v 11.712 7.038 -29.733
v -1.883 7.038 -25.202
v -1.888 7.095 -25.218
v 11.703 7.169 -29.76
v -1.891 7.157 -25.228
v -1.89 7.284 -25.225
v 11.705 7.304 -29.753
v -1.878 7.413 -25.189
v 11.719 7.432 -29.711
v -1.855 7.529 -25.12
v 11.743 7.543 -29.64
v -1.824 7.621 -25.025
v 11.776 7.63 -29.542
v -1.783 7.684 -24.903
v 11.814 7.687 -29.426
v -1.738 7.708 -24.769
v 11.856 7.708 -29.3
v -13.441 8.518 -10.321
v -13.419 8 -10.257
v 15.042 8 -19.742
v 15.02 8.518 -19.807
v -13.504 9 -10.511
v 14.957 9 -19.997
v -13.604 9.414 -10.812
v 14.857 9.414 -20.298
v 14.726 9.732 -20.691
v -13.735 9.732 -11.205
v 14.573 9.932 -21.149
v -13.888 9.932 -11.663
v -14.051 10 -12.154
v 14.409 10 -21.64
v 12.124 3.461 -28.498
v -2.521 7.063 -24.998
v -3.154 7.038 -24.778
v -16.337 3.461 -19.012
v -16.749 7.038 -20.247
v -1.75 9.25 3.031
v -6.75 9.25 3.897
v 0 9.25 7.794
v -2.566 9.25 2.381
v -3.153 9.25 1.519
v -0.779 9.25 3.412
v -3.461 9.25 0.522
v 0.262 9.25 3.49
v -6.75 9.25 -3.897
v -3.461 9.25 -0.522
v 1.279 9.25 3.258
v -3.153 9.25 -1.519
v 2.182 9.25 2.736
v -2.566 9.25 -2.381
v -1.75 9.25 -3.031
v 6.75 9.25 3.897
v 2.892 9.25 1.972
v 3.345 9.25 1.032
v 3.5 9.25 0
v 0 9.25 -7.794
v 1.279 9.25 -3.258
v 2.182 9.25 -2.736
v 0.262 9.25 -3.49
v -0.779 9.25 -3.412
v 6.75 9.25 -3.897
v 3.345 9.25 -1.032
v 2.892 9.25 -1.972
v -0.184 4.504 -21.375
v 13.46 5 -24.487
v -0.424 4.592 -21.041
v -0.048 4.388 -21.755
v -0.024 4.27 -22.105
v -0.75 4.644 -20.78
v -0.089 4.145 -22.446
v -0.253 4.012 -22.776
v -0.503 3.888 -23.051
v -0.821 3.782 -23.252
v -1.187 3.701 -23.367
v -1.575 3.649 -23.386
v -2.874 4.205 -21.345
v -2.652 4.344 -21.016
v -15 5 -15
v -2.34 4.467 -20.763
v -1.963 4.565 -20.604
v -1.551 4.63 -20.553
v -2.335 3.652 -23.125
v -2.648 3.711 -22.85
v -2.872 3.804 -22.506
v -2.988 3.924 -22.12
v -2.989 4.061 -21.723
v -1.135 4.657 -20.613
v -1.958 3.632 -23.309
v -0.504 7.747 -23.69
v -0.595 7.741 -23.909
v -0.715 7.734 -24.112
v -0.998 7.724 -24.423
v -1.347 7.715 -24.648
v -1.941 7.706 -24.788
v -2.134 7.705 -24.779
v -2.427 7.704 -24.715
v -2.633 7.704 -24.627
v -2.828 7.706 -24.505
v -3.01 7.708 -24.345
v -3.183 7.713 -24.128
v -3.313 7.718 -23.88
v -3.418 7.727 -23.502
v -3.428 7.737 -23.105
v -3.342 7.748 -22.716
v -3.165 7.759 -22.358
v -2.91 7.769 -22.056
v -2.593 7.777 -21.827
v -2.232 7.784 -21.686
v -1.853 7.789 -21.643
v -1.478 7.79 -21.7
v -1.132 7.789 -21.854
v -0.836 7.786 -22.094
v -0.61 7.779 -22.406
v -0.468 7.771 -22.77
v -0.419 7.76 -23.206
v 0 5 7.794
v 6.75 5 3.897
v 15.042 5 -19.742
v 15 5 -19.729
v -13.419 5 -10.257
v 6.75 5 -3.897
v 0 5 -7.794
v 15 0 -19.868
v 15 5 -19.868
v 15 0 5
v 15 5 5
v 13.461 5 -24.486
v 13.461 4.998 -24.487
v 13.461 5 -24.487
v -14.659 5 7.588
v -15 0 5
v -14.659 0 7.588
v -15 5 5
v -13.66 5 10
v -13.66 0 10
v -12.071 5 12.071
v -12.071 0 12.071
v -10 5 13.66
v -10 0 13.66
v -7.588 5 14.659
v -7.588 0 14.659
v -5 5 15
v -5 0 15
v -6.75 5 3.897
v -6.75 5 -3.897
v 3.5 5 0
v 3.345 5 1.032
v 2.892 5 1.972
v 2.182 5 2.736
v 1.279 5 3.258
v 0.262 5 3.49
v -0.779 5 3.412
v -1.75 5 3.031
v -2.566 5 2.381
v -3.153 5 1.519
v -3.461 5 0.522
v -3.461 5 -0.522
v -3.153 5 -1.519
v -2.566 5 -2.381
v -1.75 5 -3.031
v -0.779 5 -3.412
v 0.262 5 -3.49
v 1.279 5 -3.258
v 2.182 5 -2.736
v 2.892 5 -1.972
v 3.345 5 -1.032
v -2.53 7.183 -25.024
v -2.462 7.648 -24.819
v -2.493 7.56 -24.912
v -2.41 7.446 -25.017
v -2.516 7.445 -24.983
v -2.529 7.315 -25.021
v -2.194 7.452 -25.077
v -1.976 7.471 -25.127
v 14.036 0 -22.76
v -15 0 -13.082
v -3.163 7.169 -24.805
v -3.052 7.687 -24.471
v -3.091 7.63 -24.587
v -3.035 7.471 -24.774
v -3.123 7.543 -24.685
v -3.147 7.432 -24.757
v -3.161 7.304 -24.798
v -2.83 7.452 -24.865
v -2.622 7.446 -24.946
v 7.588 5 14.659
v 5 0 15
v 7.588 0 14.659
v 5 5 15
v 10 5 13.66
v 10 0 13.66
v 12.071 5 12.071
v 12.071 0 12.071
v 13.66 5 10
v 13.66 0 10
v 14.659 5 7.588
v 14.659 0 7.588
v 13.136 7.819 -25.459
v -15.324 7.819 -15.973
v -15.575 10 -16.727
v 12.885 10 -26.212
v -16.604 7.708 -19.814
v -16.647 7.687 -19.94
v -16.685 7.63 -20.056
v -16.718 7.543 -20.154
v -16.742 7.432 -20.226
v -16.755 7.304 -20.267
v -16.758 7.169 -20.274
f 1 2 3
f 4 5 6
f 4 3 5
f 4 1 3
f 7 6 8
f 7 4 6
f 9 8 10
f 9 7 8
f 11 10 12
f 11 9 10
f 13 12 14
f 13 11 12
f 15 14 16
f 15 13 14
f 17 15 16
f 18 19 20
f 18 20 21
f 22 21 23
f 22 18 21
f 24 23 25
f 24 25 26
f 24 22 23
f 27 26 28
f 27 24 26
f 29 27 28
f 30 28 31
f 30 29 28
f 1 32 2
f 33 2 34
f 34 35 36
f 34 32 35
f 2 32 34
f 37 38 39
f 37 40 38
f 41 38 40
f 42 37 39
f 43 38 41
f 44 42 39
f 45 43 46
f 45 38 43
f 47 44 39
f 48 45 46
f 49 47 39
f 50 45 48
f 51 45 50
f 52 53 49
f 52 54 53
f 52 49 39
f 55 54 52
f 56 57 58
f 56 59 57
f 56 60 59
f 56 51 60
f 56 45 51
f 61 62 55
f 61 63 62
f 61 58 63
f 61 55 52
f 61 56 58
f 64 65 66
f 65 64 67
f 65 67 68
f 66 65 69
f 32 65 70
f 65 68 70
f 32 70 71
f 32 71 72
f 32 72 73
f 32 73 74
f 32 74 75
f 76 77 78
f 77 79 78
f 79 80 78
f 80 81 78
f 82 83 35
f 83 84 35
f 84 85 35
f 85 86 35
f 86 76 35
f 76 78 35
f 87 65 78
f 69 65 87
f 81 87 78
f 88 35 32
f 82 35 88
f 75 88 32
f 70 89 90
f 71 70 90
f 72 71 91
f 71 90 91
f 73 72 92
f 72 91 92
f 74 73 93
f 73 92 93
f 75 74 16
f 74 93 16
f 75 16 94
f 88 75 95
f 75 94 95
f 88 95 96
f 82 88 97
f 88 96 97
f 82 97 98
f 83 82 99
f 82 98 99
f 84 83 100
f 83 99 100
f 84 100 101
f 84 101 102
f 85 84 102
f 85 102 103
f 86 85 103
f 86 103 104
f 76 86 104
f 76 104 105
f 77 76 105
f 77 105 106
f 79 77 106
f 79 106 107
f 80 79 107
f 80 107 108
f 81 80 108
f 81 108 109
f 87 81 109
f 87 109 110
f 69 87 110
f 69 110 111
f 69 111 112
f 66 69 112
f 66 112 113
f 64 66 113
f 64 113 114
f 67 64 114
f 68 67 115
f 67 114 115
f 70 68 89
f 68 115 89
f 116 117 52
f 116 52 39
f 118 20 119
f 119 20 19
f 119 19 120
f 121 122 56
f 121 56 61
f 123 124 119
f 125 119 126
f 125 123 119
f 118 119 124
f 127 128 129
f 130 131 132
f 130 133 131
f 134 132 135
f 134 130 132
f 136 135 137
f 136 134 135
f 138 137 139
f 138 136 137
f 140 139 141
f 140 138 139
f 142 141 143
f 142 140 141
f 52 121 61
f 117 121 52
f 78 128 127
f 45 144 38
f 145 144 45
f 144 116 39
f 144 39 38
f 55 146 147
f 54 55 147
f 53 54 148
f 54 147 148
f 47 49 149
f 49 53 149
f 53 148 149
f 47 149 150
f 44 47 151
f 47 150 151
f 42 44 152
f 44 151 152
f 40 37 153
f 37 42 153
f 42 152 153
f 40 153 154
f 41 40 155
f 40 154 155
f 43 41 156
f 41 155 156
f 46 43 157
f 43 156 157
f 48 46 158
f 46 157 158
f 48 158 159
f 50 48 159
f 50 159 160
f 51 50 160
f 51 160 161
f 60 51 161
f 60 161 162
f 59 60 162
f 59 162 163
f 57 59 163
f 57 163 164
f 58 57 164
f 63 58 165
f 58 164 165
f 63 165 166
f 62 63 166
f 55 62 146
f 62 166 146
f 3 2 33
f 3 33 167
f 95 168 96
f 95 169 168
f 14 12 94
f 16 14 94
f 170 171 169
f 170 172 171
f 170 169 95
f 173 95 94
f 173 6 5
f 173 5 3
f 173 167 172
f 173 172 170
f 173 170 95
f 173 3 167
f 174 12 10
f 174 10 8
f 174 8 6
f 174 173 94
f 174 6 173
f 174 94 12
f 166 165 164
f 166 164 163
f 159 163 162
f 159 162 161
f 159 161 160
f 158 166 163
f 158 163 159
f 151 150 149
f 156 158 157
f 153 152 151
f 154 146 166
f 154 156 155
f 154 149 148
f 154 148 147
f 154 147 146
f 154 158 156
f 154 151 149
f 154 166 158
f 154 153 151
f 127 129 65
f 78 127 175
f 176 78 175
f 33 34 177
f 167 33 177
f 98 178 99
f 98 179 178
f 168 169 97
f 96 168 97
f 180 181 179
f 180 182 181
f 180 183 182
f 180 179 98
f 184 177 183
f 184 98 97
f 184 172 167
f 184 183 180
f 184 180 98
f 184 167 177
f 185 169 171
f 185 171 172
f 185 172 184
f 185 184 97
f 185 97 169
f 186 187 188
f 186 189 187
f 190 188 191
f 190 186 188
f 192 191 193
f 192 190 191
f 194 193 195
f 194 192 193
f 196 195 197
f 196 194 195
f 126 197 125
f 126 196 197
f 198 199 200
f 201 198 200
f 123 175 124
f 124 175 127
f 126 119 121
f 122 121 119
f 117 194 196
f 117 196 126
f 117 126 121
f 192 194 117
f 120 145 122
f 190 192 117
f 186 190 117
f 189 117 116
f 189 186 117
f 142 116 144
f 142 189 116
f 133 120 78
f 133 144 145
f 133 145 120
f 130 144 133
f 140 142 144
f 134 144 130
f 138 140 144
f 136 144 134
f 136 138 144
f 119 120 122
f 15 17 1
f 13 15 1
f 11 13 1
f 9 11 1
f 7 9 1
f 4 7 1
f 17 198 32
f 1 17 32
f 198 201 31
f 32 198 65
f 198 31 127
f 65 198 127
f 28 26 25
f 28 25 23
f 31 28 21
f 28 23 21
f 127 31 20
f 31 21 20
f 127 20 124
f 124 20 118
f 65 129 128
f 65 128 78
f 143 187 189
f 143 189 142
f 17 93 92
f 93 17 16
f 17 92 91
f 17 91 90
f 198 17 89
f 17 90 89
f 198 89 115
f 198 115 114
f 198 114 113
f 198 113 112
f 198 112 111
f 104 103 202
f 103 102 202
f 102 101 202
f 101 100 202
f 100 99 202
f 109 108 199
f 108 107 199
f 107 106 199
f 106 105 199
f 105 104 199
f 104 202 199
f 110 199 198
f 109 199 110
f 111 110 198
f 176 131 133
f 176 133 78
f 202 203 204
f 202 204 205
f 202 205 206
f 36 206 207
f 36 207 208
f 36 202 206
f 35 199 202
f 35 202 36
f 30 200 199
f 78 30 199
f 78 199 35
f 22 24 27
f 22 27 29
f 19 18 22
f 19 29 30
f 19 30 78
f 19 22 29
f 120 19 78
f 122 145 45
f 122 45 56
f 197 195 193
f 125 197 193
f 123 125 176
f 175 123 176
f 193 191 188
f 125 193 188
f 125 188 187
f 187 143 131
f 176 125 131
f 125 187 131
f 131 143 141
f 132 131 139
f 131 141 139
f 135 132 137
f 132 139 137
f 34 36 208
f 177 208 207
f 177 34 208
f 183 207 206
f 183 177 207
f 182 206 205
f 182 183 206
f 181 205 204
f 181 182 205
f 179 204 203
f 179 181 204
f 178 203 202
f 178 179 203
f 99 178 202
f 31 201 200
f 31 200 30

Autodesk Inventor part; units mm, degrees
ref_plane "YZ Plane" through (0, 0, 0) normal (1, 0, 0) x (0, 1, 0)
ref_plane "XZ Plane" through (0, 0, 0) normal (0, 1, 0) x (-1, 0, 0)
ref_plane "XY Plane" through (0, 0, 0) normal (0, 0, 1) x (1, 0, 0)
sketch "Sketch1" plane through (0, 0, 0) normal (0, 1, 0) x (-1, 0, 0)
  line L0 (-15, 15) -> (15, 15)
  line L1 (15, 15) -> (15, -15)
  line L2 (15, -15) -> (-15, -15)
  line L3 (-15, -15) -> (-15, 15)
  line L4 (-15, 15) -> (15, -15) construction
  line L5 (15, 15) -> (-15, -15) construction
  line L6 (-15, -15) -> (-15, -25)
  line L7 (-15, -25) -> (15, -15)
  point P0 (0, 0)
  dimension "d0" = 30
  dimension "d1" = 30
  dimension "d2" = 10
extrude "Extrusion1" add sketch "Sketch1" along normal blind 5
sketch "Sketch2" plane through (0, 5, 0) normal (0, 1, 0) x (1, 0, 0)
  line L0 (15, 25) -> (-15, 15) projected
  line L1 (15, 25) -> (18.0837, 15.7488)
  line L2 (15, -15) -> (15, 25) projected
  line L3 (15, 25) -> (6.9886, 22.3295)
  line L4 (-15, 15) -> (-9.6166, 16.7945)
  line L5 (-15, 15) -> (-13.1902, 9.5707)
  point P0 (0, 0)
ref_plane "Work Plane2" through (-15, 5, -15) normal (-0.9487, 0, 0.3162) x (0, -1, 0)
sketch "Sketch3" plane through (-15, 5, -15) normal (-0.9487, 0, 0.3162) x (0, -1, 0)
  line L0 (0, 37.9473) -> (0, 0) projected
  line L1 (0, 0) -> (-5, 0)
  line L2 (-5, 0) -> (-5, 3)
  line L3 (-3, 5) -> (0, 5)
  line L4 (0, 0) -> (0, 5)
  arc A0 (-3, 5) -> (-5, 3) centre (-3, 3) ccw
  line L5 (0, 0) -> (5.0254, 0) construction
  line L6 (5, 0) -> (0, 0) projected
  line L7 (0, 0) -> (-5, -1.8199)
  line L8 (0, 0) -> (5.3209, 0) construction
  line L9 (-5, -1.8199) -> (-5, 0)
  line L10 (0, 0) -> (-3.2889, -1.1971)
  line L11 (0, 0) -> (-2.8191, -1.0261)
  line L12 (0, 0) -> (1.5391, -4.2286)
  line L13 (1.5391, -4.2286) -> (-2.6895, -5.7677)
  line L14 (-2.6895, -5.7677) -> (-2.8191, -1.0261)
  point P0 (5, 18.9737)
  point P1 (-5, 5)
  dimension "d5" = 5
  dimension "d6" = 5
  dimension "d7" = 2
  dimension "d9" = 160
  dimension "d12" = 3.5
  dimension "d20" = 3
  dimension "d21" = 4.5
extrude "Extrusion2" add sketch "Sketch3" against normal blind 30
ref_plane "Work Plane4" through (-16.8239, 7.6895, -20.4717) normal (0.1082, -0.9397, 0.3245) x (0.9487, 0, -0.3162)
sketch "Sketch5" plane through (-16.8239, 7.6895, -20.4717) normal (0.1082, -0.9397, 0.3245) x (0.9487, 0, -0.3162)
  line L0 (30, 4.5) -> (30, 0) projected
  line L1 (30, 0) -> (30, -0.5)
  line L2 (30, -0.5) -> (15, -0.5)
  line L3 (15, -0.5) -> (15, 2)
  circle A0 centre (15, 2) radius 1.5
  point P0 (9.4868, 20.6193)
  dimension "d24" = 0.5
  dimension "d25" = 15
  dimension "d26" = 2.5
  dimension "d27" = 3
extrude "Extrusion4" cut sketch "Sketch5" along normal blind 10
sketch "Sketch6" plane through (0, 5, 0) normal (0, 1, 0) x (1, 0, 0)
  circle A0 centre (0, 0) radius 6.75
  line L0 (-6.75, 3.8971) -> (0, 7.7942)
  line L1 (0, 7.7942) -> (6.75, 3.8971)
  line L2 (6.75, 3.8971) -> (6.75, -3.8971)
  line L3 (6.75, -3.8971) -> (0, -7.7942)
  line L4 (0, -7.7942) -> (-6.75, -3.8971)
  line L5 (-6.75, -3.8971) -> (-6.75, 3.8971)
  circle A1 centre (0, 0) radius 3.5
  point P0 (-6.75, 0)
  dimension "d43" = 13.5
  dimension "d44" = 7
extrude "Extrusion5" add sketch "Sketch6" along normal blind 4.25
sketch "Sketch7" plane through (-15, 5, -15) normal (-0.9487, 0, 0.3162) x (0, -1, 0)
  line L0 (0, 0) -> (6.5506, 2.3842)
  line L1 (0, 0) -> (6.971, 0) construction
  line L2 (6.5506, 2.3842) -> (6.5506, -3.325)
  line L3 (6.5506, -3.325) -> (0, 0)
  point P0 (5, 18.9737)
  dimension "d34" = 20
extrude "Extrusion6" cut sketch "Sketch7" along normal blind 5 and the other way blind 40
fillet "Fillet2" radius 0.5 1 edges at (-2.5937, 7.6895, -25.2151)
sketch "Sketch8" plane through (-13.4189, 5, -10.2566) normal (0.3162, 0, 0.9487) x (0.9487, 0, -0.3162)
  line L0 (30, 0) -> (31.6228, 0) projected
  line L1 (30, 0) -> (36.1043, 0)
  line L2 (36.1043, 0) -> (36.1043, -10.0041)
  line L3 (36.1043, -10.0041) -> (30, -10.0041)
  line L4 (30, -10.0041) -> (30, 0)
  point P0 (9.4868, -5)
extrude "Extrusion7" cut sketch "Sketch8" along normal mid plane 20
fillet "Fillet3" radius 10 2 edges at (15, 2.5, 15) (-15, 2.5, 15)
properties part number "sem2_thumbmount"
